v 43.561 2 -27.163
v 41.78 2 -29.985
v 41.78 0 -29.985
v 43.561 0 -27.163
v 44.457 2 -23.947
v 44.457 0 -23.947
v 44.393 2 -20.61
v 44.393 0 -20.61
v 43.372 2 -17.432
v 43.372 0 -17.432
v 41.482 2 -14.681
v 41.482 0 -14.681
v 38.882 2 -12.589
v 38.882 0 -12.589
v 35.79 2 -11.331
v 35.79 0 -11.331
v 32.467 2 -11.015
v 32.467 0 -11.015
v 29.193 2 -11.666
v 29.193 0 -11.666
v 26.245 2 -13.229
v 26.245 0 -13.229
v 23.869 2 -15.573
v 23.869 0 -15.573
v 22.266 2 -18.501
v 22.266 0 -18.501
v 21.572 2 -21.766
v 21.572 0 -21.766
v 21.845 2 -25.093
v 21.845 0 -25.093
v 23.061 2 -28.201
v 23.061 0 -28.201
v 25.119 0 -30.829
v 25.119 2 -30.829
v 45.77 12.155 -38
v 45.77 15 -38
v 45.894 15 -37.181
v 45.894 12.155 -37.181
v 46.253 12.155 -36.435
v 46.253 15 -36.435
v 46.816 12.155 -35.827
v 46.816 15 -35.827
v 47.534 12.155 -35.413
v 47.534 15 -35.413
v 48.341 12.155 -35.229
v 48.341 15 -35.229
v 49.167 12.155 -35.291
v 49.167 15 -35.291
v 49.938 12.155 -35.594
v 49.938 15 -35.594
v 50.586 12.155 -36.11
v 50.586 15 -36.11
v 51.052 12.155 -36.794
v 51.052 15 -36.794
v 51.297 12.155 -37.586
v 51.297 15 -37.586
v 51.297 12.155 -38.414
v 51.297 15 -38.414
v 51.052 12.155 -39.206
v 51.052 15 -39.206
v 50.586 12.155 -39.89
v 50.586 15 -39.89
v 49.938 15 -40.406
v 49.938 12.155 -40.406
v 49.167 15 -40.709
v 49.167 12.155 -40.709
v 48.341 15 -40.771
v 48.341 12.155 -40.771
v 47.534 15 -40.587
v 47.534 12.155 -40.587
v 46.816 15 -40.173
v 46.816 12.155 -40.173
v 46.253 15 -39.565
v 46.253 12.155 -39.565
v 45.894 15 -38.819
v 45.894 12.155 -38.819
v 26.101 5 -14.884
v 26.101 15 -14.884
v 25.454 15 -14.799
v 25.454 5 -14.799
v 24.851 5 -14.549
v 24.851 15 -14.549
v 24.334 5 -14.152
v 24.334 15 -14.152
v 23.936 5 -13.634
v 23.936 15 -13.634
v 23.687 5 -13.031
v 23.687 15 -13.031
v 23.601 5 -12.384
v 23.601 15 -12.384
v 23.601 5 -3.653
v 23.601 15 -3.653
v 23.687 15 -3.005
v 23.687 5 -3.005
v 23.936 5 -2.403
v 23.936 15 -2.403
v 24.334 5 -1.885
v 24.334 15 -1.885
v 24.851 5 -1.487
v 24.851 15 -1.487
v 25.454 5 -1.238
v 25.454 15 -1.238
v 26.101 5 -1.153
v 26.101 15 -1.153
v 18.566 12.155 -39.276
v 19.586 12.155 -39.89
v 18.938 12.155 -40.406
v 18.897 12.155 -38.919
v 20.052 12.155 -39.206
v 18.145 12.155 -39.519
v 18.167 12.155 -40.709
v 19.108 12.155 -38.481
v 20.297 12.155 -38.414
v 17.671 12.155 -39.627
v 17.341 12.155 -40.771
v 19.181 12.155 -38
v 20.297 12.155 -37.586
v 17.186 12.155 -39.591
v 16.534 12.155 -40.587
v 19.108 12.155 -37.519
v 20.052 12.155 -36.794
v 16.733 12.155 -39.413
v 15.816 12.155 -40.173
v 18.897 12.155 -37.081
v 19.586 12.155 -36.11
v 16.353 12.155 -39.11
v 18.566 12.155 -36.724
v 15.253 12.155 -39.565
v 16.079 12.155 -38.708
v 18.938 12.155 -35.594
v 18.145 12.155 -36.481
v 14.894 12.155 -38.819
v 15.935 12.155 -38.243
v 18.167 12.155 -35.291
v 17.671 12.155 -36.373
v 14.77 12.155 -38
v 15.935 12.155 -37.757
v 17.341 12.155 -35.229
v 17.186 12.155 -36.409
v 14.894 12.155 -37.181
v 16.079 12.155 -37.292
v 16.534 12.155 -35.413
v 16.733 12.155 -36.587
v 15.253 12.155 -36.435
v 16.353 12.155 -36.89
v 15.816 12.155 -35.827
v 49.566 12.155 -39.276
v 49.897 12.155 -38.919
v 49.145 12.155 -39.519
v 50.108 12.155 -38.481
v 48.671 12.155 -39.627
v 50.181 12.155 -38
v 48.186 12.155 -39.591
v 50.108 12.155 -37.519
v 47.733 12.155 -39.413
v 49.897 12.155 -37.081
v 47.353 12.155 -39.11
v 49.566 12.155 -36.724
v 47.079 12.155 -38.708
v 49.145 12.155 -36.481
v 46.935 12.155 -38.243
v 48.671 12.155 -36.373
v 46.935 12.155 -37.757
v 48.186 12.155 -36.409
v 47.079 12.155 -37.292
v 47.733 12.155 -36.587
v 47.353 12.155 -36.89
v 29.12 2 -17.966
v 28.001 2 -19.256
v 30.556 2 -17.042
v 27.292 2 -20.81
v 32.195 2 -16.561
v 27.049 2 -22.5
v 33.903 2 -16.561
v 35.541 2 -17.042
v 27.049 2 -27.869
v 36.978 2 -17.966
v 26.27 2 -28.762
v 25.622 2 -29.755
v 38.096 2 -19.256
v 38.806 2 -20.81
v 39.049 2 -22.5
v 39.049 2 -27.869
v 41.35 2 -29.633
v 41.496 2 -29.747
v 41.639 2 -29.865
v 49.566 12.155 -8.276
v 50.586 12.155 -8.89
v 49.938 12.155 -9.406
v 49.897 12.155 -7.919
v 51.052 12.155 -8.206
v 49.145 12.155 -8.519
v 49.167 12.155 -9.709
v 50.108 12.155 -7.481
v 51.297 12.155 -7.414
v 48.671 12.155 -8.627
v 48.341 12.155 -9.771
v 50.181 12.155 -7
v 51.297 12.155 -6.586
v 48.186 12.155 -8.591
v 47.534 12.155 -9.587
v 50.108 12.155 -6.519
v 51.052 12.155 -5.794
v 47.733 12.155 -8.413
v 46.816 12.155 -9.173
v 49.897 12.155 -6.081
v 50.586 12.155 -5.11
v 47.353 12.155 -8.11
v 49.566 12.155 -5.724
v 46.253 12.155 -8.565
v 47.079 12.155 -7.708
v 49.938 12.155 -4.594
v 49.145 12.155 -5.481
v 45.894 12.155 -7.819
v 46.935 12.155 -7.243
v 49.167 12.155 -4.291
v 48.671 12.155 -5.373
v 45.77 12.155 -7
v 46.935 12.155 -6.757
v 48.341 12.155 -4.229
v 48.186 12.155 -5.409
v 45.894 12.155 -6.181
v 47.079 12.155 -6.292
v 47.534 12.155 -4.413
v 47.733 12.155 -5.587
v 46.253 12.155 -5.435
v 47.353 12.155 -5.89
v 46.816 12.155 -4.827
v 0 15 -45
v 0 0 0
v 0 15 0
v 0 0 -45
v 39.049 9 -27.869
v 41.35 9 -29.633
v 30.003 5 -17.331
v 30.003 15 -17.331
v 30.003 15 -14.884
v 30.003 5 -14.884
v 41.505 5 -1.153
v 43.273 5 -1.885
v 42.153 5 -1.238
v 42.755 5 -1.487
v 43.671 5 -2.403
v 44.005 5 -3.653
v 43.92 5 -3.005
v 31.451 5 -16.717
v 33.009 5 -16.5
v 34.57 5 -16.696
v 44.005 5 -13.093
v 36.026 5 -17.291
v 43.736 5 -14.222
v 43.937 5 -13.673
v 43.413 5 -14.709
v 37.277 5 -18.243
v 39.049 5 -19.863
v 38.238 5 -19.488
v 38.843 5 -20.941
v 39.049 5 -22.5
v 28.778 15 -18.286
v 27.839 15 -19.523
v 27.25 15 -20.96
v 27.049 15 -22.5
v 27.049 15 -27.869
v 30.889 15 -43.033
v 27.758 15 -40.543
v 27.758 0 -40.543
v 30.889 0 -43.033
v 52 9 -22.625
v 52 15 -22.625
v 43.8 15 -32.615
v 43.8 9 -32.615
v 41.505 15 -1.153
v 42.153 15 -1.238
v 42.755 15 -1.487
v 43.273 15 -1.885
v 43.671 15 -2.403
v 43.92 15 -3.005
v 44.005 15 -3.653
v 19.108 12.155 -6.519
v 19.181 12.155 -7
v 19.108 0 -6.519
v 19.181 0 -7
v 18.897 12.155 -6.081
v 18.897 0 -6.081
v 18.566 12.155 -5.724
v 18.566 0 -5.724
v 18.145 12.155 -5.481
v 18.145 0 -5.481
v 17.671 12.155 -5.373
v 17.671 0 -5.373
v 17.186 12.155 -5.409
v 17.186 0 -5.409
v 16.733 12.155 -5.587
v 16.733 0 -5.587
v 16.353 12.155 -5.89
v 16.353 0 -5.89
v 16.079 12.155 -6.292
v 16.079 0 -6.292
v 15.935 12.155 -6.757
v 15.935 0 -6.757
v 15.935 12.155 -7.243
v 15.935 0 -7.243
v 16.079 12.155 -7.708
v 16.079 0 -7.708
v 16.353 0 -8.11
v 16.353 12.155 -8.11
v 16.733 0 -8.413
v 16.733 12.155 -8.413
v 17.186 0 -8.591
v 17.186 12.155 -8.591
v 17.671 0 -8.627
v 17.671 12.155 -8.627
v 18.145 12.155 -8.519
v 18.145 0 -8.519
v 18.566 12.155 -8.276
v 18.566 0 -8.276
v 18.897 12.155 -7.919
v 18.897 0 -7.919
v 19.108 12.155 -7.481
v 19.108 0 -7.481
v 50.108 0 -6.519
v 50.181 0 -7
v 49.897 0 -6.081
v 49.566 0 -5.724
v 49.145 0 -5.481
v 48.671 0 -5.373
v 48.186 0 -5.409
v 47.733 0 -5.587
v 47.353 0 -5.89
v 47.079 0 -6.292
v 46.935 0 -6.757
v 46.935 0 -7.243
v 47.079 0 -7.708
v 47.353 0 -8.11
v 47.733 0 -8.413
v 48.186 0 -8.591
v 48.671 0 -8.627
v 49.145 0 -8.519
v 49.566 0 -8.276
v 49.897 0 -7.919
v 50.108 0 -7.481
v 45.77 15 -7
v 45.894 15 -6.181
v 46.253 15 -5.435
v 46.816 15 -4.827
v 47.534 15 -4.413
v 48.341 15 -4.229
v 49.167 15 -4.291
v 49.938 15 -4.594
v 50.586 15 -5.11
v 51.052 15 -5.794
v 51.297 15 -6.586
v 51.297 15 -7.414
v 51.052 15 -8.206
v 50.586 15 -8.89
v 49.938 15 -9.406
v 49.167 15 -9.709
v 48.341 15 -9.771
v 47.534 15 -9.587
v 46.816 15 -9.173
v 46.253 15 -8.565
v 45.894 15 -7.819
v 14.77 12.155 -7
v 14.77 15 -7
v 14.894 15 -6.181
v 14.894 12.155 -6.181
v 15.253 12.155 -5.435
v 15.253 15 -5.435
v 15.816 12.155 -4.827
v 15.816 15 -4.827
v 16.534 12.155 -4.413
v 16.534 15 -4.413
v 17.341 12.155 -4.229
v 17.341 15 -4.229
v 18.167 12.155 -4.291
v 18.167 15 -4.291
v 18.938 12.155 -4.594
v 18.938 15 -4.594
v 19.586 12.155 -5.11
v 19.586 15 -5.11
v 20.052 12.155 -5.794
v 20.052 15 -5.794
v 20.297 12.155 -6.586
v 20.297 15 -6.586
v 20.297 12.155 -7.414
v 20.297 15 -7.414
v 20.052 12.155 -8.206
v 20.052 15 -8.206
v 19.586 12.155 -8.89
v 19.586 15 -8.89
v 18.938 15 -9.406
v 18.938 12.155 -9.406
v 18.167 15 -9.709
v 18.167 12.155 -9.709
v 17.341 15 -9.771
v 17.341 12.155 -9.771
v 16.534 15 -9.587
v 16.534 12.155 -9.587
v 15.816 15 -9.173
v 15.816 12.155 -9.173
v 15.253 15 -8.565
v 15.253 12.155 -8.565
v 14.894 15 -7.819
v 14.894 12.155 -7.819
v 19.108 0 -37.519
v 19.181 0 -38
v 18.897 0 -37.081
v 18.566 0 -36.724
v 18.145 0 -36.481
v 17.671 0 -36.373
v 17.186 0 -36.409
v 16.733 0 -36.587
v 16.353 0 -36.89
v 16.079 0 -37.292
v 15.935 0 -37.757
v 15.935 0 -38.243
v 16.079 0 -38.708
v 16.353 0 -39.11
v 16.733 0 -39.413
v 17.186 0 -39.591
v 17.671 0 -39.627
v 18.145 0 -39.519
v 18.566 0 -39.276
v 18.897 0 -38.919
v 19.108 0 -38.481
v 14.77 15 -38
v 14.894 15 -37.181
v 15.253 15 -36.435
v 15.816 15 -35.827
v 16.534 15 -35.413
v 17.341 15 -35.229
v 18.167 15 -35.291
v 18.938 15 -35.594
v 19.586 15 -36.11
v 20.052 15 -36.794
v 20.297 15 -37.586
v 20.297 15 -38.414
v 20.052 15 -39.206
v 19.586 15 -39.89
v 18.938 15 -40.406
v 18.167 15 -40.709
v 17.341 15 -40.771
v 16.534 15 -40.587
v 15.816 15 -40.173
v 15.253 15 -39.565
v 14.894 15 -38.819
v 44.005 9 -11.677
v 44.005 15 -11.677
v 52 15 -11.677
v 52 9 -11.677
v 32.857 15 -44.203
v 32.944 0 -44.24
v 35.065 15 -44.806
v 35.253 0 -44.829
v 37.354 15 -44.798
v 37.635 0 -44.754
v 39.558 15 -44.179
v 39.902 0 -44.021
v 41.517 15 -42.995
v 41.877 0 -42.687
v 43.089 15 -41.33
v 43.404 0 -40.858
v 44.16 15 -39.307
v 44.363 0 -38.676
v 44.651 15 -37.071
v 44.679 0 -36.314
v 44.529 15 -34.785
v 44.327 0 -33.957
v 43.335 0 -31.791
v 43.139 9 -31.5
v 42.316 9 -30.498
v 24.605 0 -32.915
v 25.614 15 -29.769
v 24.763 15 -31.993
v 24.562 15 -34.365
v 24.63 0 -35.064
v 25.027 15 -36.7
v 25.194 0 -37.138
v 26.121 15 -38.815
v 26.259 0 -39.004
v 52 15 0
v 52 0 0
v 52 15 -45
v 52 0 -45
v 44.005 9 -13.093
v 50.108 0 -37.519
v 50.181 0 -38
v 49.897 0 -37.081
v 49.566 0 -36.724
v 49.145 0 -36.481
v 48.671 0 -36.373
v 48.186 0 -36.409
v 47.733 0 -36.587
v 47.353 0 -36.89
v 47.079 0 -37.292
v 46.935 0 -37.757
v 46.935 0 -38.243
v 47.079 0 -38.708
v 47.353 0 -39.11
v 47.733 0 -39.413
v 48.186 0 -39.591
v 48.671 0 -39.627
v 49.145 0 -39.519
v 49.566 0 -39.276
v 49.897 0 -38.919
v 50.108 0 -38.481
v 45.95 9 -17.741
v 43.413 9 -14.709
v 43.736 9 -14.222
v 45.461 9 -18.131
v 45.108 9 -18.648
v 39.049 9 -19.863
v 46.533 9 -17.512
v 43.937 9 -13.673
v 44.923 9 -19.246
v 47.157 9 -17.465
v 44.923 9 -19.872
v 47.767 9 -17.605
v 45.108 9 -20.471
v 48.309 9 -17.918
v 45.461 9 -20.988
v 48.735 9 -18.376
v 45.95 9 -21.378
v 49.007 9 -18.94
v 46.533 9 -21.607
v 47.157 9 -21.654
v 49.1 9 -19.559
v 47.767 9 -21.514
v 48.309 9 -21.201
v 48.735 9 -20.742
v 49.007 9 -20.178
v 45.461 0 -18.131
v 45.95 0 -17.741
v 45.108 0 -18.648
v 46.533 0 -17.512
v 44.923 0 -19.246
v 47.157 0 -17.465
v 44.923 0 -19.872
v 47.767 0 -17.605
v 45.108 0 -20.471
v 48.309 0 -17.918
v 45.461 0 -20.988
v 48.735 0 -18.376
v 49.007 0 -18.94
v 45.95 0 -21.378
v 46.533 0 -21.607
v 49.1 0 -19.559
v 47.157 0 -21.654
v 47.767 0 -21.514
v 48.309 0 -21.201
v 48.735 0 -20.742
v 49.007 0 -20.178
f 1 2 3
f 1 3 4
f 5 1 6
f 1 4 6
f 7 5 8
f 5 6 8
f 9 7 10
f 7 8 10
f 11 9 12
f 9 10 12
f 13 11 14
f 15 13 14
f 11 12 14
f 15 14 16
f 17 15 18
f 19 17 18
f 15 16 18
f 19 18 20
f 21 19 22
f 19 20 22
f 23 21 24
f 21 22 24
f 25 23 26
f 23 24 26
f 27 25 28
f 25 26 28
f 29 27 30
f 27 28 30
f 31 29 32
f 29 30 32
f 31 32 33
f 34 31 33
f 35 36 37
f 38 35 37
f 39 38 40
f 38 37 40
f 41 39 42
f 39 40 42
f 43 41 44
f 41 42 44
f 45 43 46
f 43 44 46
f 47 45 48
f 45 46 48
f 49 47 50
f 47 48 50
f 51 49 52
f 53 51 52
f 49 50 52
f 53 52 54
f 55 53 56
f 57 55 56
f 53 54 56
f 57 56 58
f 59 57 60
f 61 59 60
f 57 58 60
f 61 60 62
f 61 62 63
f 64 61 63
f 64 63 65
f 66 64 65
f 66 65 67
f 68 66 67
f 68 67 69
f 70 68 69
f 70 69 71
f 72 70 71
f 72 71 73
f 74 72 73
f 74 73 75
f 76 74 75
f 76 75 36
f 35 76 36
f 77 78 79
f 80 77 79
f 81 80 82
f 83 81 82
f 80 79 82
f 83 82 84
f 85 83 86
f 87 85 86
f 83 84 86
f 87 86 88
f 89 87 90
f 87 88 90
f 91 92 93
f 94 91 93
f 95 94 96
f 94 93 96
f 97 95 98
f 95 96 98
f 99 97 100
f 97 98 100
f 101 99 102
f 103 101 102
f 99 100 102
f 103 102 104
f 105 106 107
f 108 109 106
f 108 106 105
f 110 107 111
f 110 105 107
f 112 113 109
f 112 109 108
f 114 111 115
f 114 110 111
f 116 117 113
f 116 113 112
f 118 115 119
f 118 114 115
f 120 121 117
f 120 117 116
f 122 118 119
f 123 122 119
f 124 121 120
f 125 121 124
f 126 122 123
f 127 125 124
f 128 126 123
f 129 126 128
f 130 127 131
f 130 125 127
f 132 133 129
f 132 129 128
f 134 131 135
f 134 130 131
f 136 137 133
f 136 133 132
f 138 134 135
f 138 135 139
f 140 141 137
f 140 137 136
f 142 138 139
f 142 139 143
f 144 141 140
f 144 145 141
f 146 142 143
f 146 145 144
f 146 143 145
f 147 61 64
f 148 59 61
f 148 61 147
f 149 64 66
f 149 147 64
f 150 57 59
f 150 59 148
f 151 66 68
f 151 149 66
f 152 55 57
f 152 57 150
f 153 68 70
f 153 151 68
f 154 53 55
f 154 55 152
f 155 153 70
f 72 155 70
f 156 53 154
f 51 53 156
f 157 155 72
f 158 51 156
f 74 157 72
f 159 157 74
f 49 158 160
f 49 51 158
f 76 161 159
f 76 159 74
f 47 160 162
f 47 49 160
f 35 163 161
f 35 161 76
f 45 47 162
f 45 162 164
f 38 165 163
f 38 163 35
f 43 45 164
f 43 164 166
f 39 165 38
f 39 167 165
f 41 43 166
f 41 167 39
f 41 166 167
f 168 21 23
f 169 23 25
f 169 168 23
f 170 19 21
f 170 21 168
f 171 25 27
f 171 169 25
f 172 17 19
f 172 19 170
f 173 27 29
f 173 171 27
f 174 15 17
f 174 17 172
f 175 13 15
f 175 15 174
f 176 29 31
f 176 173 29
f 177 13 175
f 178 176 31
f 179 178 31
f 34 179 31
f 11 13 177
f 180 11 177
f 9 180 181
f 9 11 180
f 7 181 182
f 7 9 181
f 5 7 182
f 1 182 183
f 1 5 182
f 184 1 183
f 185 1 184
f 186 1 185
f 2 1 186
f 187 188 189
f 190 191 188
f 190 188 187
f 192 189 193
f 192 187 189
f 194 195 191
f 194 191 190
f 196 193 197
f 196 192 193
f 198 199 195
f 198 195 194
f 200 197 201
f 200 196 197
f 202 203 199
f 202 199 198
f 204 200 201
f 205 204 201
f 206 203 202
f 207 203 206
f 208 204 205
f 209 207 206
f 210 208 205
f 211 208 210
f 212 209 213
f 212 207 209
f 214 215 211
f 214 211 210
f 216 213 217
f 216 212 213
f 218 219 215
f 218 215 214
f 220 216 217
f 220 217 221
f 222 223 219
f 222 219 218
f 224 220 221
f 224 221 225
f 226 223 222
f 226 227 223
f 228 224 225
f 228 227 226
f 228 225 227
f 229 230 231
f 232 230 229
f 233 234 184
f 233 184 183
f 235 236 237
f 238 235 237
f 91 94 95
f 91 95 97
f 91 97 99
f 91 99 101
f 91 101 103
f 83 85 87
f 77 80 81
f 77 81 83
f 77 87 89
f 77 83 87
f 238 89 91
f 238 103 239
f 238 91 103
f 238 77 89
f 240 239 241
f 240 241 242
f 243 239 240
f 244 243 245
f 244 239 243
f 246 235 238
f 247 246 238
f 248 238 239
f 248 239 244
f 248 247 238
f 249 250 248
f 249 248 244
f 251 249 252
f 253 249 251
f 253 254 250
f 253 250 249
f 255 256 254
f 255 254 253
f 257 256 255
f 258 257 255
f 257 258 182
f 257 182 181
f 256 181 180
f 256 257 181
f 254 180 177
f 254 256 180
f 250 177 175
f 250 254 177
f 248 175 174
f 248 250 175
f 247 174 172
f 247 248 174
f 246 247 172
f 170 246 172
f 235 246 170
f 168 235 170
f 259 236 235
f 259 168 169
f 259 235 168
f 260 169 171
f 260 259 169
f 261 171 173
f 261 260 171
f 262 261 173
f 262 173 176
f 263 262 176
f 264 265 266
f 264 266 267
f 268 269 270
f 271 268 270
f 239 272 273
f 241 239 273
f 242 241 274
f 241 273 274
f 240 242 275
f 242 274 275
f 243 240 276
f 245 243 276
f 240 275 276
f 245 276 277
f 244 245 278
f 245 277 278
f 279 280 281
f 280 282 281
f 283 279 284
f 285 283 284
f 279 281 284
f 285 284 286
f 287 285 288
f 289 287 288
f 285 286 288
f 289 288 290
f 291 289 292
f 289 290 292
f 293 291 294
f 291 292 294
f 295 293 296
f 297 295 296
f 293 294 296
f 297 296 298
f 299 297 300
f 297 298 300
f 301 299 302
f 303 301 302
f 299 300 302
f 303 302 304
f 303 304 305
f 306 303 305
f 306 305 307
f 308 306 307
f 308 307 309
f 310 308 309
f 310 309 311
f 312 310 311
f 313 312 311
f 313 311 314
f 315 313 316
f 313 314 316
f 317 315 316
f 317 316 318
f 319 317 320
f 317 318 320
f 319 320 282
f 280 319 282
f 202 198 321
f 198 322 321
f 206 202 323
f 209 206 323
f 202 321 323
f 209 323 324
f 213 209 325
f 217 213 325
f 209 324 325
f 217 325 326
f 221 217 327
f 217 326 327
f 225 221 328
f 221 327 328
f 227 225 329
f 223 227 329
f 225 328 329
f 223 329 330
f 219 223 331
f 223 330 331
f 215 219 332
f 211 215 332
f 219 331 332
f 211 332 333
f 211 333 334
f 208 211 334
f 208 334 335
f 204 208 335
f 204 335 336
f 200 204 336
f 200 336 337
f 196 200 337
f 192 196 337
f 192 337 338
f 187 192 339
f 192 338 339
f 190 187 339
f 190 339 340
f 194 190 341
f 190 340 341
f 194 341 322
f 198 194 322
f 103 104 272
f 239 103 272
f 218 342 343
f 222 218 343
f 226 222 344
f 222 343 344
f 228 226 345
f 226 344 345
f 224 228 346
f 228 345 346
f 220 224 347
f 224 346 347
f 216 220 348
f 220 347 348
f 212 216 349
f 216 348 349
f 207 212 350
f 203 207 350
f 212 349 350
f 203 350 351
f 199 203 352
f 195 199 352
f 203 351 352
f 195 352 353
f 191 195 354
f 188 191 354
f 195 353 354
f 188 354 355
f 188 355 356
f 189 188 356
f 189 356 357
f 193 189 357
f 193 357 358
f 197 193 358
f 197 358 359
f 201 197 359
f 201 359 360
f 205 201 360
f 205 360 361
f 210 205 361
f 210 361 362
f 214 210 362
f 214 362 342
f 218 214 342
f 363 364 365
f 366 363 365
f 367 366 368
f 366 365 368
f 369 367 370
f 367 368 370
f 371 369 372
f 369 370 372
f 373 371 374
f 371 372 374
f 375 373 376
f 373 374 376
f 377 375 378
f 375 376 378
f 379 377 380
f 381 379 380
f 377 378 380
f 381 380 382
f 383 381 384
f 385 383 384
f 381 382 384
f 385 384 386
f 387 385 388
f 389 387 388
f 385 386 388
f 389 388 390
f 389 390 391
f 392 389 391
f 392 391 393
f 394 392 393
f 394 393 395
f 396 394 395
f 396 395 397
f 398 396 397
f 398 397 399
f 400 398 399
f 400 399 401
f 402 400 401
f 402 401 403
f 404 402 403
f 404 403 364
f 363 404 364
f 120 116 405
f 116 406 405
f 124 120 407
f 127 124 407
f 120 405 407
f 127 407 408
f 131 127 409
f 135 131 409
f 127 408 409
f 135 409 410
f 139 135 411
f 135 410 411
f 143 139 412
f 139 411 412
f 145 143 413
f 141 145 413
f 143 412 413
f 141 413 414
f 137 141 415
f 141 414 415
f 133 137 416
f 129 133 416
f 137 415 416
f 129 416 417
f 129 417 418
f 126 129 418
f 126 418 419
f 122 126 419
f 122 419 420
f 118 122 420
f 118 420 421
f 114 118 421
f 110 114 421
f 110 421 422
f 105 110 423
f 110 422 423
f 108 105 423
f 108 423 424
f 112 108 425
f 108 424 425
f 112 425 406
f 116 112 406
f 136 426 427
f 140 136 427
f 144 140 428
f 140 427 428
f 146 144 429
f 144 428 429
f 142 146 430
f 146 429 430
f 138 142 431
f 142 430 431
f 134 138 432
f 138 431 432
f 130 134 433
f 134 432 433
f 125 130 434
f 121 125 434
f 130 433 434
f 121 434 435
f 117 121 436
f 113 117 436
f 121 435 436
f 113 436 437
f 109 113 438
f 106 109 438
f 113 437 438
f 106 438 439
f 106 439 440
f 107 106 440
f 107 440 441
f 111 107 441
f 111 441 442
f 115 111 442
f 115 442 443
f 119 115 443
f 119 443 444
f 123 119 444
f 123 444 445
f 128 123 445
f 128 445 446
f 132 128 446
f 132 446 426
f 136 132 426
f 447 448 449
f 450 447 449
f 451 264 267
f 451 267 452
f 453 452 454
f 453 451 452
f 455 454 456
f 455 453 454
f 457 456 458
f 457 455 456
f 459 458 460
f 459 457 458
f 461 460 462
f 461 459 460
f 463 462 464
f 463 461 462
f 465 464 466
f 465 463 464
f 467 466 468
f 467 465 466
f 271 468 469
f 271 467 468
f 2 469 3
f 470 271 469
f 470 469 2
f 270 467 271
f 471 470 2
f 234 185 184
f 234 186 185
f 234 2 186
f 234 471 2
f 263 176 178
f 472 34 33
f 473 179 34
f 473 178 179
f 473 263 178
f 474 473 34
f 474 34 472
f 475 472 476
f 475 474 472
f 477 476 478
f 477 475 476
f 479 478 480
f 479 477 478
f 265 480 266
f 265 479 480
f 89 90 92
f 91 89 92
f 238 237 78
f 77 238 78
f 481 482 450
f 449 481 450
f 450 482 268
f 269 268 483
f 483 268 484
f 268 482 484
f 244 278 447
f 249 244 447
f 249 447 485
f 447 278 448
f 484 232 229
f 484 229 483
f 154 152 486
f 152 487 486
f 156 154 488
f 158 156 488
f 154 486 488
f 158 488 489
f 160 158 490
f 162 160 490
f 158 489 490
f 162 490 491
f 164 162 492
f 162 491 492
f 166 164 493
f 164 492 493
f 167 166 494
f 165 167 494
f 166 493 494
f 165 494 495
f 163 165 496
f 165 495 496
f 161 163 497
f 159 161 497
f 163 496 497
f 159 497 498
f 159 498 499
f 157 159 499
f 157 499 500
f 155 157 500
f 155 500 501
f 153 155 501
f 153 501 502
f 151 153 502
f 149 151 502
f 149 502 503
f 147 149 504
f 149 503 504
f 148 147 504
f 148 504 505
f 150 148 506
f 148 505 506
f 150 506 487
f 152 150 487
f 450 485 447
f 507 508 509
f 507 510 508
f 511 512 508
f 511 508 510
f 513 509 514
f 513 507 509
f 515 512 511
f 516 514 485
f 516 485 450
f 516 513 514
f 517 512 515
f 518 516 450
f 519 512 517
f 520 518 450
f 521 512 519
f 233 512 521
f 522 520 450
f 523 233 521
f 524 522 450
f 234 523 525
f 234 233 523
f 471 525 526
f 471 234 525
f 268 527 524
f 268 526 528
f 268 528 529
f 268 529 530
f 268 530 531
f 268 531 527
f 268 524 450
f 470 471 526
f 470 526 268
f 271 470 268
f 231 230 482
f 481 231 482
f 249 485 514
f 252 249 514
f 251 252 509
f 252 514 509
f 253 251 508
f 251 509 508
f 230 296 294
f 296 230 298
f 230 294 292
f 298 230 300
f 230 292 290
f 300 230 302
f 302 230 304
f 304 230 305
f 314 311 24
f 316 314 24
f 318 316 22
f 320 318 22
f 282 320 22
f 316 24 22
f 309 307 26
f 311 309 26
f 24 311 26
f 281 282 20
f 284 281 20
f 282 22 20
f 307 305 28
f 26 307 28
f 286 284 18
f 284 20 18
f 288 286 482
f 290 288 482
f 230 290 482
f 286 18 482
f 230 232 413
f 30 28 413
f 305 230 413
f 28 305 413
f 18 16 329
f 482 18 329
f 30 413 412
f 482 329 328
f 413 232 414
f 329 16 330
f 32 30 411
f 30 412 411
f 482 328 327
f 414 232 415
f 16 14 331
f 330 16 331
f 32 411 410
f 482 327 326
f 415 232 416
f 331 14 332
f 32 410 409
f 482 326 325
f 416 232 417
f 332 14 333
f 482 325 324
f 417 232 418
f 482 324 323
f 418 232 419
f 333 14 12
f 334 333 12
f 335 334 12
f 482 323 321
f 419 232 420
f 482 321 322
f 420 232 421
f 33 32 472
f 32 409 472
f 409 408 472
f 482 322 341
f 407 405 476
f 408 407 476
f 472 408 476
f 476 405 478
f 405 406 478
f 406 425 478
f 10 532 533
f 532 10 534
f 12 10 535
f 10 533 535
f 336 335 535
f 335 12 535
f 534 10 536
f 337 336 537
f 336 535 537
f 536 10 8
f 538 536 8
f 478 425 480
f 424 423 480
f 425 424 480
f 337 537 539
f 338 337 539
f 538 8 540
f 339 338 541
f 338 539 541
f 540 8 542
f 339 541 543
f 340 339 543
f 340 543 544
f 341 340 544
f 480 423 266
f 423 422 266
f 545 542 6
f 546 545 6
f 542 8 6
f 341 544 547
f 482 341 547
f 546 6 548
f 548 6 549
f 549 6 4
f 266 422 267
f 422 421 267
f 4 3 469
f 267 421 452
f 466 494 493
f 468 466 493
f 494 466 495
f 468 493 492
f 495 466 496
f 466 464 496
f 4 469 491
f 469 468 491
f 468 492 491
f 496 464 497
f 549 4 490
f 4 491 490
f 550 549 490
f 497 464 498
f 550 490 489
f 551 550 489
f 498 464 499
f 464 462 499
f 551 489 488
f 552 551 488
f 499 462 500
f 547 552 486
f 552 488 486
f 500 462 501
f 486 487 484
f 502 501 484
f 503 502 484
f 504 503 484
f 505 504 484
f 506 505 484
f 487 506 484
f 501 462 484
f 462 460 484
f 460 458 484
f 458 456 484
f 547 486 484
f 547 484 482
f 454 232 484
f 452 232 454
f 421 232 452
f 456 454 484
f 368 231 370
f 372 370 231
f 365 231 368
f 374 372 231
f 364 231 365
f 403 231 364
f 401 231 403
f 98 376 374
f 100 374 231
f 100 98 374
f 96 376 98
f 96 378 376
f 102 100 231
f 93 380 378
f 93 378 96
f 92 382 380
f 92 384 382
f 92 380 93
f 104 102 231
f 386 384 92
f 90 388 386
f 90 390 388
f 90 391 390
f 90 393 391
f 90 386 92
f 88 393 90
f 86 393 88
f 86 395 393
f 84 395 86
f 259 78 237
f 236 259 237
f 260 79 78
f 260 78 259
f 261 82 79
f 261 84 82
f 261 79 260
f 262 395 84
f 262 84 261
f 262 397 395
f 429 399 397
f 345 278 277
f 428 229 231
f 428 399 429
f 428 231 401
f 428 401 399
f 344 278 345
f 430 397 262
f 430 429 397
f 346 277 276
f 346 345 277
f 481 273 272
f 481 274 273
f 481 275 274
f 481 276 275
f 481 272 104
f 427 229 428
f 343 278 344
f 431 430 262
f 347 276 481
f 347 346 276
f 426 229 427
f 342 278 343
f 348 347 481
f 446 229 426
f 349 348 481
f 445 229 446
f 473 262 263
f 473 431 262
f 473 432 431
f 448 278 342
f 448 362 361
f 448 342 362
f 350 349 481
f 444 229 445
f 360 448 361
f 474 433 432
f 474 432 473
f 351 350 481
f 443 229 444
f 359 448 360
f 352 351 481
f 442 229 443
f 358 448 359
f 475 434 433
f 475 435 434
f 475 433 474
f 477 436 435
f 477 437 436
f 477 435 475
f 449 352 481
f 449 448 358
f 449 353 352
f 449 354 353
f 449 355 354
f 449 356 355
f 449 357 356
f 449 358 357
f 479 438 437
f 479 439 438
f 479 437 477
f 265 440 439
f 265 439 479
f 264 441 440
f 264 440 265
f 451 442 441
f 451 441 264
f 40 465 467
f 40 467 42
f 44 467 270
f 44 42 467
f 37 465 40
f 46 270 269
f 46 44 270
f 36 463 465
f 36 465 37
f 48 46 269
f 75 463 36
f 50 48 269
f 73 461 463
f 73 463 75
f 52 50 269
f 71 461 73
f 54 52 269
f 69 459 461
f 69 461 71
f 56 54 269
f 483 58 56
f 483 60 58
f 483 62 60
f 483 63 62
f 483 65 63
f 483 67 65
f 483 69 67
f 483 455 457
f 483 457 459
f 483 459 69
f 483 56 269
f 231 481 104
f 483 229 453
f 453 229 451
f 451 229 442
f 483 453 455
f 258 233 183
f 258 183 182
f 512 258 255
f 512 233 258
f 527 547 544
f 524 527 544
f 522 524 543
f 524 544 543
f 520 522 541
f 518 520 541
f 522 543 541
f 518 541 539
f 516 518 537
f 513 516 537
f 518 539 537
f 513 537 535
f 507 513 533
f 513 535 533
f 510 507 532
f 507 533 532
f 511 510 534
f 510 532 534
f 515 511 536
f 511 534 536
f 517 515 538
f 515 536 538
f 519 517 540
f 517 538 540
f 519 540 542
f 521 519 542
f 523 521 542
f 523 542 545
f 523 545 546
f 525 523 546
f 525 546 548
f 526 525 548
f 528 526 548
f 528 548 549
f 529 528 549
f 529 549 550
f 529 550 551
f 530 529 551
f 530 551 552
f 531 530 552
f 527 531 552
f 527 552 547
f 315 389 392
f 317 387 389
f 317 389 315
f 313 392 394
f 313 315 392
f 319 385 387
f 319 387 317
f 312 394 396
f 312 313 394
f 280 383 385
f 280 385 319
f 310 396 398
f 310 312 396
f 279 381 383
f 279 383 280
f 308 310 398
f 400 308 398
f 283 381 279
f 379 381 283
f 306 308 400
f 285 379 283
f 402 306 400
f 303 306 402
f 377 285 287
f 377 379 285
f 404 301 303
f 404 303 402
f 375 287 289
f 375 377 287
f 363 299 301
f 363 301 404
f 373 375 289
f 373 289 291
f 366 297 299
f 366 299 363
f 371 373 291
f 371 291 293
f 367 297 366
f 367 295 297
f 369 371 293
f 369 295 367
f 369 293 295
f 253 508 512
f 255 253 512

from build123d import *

# Parameters (mm, degrees)
SKETCH1_W                                      = 52
SKETCH1_H                                      = 45
BOSS_EXTRUDE1_DEPTH                            = 15
SKETCH2_R                                      = 11.5
CUT_EXTRUDE1_DEPTH                             = 2
CBORE_FOR_4_SOCKET_HEAD_CAP_SCREW1_D           = 3.2639
CBORE_FOR_4_SOCKET_HEAD_CAP_SCREW1_CBORE_D     = 5.55752
CBORE_FOR_4_SOCKET_HEAD_CAP_SCREW1_CBORE_DEPTH = 2.8448
CUT_EXTRUDE3_DEPTH                             = 71.384657419
CUT_EXTRUDE4_DEPTH                             = 10
CUT_EXTRUDE5_DEPTH                             = 6
M5_TAPPED_HOLE3_D                              = 4.2


with BuildPart() as part:
    # Sketch1 → Boss-Extrude1 (new body)
    with BuildSketch(Plane(origin=(0, 0, 0), x_dir=(1, 0, 0), z_dir=(0, 1, 0))):
        with Locations((26, 22.5)):
            Rectangle(SKETCH1_W, SKETCH1_H)
    extrude(amount=BOSS_EXTRUDE1_DEPTH)

    # Sketch2 → Cut-Extrude1 (cut)
    with BuildSketch(Plane.XZ):
        with Locations((33.048851489, -22.5)):
            Circle(SKETCH2_R)
    extrude(amount=-CUT_EXTRUDE1_DEPTH, mode=Mode.SUBTRACT)

    # CBORE for #4 Socket Head Cap Screw1 (through all)
    with Locations(Plane(origin=(0, 15, 0), x_dir=(-1, 0, 0), z_dir=(0, 1, 0))):
        with Locations((-48.548851489, -38), (-48.548851489, -7), (-17.548851489, -7), (-17.548851489, -38)):
            CounterBoreHole(CBORE_FOR_4_SOCKET_HEAD_CAP_SCREW1_D / 2, CBORE_FOR_4_SOCKET_HEAD_CAP_SCREW1_CBORE_D / 2, CBORE_FOR_4_SOCKET_HEAD_CAP_SCREW1_CBORE_DEPTH)

    # Sketch8 → Cut-Extrude3 (cut, through all)
    with BuildSketch(Plane(origin=(0, 15, 0), x_dir=(1, 0, 0), z_dir=(0, 1, 0))):
        with BuildLine():
            Line((27.048851489, 22.5), (27.048851489, 27.869202711))
            ThreePointArc((27.048851489, 27.869202711), (24.562140957, 34.365125617), (27.7583836, 40.542890313))
            Line((27.7583836, 40.542890313), (30.889155511, 43.032522261))
            ThreePointArc((30.889155511, 43.032522261), (42.879465836, 41.610512499), (41.350499943, 29.633371074))
            Line((41.350499943, 29.633371074), (39.048851489, 27.869202711))
            Line((39.048851489, 27.869202711), (39.048851489, 22.5))
            ThreePointArc((39.048851489, 22.5), (33.048851489, 16.5), (27.048851489, 22.5))
        make_face()
    extrude(amount=-CUT_EXTRUDE3_DEPTH, mode=Mode.SUBTRACT)

    # Sketch11 → Cut-Extrude4 (cut)
    with BuildSketch(Plane(origin=(0, 15, 0), x_dir=(1, 0, 0), z_dir=(0, 1, 0))):
        with BuildLine():
            Line((23.601490667, 12.384290412), (23.601490667, 3.652513208))
            ThreePointArc((23.601490667, 3.652513208), (24.333723714, 1.884746256), (26.101490667, 1.152513208))
            Line((26.101490667, 1.152513208), (41.505460803, 1.152513208))
            ThreePointArc((41.505460803, 1.152513208), (43.273227756, 1.884746256), (44.005460803, 3.652513208))
            Line((44.005460803, 3.652513208), (44.005460803, 13.09315188))
            ThreePointArc((44.005460803, 13.09315188), (43.852771156, 13.953462349), (43.41335352, 14.708684417))
            Line((43.41335352, 14.708684417), (39.048851489, 19.863022972))
            Line((39.048851489, 19.863022972), (39.048851489, 34.725308874))
            Line((39.048851489, 34.725308874), (27.048851489, 34.725308874))
            Line((27.048851489, 34.725308874), (27.048851489, 22.5))
            ThreePointArc((27.048851489, 22.5), (27.839413547, 19.523129776), (30.002770266, 17.330726436))
            Line((30.002770266, 17.330726436), (30.002770266, 14.884290412))
            Line((30.002770266, 14.884290412), (26.101490667, 14.884290412))
            ThreePointArc((26.101490667, 14.884290412), (24.333723714, 14.152057365), (23.601490667, 12.384290412))
        make_face()
    extrude(amount=-CUT_EXTRUDE4_DEPTH, mode=Mode.SUBTRACT)

    # Sketch12 → Cut-Extrude5 (cut)
    with BuildSketch(Plane(origin=(0, 15, 0), x_dir=(1, 0, 0), z_dir=(0, 1, 0))):
        Polygon((43.546506973, 11.676957706), (53.351680383, 11.676957706), (53.351680383, 20.978390716), (41.522528086, 35.389540724), (36.326040528, 27.362061402), (38.483158835, 17.285853694), align=None)
    extrude(amount=-CUT_EXTRUDE5_DEPTH, mode=Mode.SUBTRACT)

    # M5 Tapped Hole3 (through all)
    with Locations(Plane(origin=(0, 15, 0), x_dir=(-1, 0, 0), z_dir=(0, 1, 0))):
        with Locations((-47, -19.55942237)):
            Hole(M5_TAPPED_HOLE3_D / 2)


solid = part.part
